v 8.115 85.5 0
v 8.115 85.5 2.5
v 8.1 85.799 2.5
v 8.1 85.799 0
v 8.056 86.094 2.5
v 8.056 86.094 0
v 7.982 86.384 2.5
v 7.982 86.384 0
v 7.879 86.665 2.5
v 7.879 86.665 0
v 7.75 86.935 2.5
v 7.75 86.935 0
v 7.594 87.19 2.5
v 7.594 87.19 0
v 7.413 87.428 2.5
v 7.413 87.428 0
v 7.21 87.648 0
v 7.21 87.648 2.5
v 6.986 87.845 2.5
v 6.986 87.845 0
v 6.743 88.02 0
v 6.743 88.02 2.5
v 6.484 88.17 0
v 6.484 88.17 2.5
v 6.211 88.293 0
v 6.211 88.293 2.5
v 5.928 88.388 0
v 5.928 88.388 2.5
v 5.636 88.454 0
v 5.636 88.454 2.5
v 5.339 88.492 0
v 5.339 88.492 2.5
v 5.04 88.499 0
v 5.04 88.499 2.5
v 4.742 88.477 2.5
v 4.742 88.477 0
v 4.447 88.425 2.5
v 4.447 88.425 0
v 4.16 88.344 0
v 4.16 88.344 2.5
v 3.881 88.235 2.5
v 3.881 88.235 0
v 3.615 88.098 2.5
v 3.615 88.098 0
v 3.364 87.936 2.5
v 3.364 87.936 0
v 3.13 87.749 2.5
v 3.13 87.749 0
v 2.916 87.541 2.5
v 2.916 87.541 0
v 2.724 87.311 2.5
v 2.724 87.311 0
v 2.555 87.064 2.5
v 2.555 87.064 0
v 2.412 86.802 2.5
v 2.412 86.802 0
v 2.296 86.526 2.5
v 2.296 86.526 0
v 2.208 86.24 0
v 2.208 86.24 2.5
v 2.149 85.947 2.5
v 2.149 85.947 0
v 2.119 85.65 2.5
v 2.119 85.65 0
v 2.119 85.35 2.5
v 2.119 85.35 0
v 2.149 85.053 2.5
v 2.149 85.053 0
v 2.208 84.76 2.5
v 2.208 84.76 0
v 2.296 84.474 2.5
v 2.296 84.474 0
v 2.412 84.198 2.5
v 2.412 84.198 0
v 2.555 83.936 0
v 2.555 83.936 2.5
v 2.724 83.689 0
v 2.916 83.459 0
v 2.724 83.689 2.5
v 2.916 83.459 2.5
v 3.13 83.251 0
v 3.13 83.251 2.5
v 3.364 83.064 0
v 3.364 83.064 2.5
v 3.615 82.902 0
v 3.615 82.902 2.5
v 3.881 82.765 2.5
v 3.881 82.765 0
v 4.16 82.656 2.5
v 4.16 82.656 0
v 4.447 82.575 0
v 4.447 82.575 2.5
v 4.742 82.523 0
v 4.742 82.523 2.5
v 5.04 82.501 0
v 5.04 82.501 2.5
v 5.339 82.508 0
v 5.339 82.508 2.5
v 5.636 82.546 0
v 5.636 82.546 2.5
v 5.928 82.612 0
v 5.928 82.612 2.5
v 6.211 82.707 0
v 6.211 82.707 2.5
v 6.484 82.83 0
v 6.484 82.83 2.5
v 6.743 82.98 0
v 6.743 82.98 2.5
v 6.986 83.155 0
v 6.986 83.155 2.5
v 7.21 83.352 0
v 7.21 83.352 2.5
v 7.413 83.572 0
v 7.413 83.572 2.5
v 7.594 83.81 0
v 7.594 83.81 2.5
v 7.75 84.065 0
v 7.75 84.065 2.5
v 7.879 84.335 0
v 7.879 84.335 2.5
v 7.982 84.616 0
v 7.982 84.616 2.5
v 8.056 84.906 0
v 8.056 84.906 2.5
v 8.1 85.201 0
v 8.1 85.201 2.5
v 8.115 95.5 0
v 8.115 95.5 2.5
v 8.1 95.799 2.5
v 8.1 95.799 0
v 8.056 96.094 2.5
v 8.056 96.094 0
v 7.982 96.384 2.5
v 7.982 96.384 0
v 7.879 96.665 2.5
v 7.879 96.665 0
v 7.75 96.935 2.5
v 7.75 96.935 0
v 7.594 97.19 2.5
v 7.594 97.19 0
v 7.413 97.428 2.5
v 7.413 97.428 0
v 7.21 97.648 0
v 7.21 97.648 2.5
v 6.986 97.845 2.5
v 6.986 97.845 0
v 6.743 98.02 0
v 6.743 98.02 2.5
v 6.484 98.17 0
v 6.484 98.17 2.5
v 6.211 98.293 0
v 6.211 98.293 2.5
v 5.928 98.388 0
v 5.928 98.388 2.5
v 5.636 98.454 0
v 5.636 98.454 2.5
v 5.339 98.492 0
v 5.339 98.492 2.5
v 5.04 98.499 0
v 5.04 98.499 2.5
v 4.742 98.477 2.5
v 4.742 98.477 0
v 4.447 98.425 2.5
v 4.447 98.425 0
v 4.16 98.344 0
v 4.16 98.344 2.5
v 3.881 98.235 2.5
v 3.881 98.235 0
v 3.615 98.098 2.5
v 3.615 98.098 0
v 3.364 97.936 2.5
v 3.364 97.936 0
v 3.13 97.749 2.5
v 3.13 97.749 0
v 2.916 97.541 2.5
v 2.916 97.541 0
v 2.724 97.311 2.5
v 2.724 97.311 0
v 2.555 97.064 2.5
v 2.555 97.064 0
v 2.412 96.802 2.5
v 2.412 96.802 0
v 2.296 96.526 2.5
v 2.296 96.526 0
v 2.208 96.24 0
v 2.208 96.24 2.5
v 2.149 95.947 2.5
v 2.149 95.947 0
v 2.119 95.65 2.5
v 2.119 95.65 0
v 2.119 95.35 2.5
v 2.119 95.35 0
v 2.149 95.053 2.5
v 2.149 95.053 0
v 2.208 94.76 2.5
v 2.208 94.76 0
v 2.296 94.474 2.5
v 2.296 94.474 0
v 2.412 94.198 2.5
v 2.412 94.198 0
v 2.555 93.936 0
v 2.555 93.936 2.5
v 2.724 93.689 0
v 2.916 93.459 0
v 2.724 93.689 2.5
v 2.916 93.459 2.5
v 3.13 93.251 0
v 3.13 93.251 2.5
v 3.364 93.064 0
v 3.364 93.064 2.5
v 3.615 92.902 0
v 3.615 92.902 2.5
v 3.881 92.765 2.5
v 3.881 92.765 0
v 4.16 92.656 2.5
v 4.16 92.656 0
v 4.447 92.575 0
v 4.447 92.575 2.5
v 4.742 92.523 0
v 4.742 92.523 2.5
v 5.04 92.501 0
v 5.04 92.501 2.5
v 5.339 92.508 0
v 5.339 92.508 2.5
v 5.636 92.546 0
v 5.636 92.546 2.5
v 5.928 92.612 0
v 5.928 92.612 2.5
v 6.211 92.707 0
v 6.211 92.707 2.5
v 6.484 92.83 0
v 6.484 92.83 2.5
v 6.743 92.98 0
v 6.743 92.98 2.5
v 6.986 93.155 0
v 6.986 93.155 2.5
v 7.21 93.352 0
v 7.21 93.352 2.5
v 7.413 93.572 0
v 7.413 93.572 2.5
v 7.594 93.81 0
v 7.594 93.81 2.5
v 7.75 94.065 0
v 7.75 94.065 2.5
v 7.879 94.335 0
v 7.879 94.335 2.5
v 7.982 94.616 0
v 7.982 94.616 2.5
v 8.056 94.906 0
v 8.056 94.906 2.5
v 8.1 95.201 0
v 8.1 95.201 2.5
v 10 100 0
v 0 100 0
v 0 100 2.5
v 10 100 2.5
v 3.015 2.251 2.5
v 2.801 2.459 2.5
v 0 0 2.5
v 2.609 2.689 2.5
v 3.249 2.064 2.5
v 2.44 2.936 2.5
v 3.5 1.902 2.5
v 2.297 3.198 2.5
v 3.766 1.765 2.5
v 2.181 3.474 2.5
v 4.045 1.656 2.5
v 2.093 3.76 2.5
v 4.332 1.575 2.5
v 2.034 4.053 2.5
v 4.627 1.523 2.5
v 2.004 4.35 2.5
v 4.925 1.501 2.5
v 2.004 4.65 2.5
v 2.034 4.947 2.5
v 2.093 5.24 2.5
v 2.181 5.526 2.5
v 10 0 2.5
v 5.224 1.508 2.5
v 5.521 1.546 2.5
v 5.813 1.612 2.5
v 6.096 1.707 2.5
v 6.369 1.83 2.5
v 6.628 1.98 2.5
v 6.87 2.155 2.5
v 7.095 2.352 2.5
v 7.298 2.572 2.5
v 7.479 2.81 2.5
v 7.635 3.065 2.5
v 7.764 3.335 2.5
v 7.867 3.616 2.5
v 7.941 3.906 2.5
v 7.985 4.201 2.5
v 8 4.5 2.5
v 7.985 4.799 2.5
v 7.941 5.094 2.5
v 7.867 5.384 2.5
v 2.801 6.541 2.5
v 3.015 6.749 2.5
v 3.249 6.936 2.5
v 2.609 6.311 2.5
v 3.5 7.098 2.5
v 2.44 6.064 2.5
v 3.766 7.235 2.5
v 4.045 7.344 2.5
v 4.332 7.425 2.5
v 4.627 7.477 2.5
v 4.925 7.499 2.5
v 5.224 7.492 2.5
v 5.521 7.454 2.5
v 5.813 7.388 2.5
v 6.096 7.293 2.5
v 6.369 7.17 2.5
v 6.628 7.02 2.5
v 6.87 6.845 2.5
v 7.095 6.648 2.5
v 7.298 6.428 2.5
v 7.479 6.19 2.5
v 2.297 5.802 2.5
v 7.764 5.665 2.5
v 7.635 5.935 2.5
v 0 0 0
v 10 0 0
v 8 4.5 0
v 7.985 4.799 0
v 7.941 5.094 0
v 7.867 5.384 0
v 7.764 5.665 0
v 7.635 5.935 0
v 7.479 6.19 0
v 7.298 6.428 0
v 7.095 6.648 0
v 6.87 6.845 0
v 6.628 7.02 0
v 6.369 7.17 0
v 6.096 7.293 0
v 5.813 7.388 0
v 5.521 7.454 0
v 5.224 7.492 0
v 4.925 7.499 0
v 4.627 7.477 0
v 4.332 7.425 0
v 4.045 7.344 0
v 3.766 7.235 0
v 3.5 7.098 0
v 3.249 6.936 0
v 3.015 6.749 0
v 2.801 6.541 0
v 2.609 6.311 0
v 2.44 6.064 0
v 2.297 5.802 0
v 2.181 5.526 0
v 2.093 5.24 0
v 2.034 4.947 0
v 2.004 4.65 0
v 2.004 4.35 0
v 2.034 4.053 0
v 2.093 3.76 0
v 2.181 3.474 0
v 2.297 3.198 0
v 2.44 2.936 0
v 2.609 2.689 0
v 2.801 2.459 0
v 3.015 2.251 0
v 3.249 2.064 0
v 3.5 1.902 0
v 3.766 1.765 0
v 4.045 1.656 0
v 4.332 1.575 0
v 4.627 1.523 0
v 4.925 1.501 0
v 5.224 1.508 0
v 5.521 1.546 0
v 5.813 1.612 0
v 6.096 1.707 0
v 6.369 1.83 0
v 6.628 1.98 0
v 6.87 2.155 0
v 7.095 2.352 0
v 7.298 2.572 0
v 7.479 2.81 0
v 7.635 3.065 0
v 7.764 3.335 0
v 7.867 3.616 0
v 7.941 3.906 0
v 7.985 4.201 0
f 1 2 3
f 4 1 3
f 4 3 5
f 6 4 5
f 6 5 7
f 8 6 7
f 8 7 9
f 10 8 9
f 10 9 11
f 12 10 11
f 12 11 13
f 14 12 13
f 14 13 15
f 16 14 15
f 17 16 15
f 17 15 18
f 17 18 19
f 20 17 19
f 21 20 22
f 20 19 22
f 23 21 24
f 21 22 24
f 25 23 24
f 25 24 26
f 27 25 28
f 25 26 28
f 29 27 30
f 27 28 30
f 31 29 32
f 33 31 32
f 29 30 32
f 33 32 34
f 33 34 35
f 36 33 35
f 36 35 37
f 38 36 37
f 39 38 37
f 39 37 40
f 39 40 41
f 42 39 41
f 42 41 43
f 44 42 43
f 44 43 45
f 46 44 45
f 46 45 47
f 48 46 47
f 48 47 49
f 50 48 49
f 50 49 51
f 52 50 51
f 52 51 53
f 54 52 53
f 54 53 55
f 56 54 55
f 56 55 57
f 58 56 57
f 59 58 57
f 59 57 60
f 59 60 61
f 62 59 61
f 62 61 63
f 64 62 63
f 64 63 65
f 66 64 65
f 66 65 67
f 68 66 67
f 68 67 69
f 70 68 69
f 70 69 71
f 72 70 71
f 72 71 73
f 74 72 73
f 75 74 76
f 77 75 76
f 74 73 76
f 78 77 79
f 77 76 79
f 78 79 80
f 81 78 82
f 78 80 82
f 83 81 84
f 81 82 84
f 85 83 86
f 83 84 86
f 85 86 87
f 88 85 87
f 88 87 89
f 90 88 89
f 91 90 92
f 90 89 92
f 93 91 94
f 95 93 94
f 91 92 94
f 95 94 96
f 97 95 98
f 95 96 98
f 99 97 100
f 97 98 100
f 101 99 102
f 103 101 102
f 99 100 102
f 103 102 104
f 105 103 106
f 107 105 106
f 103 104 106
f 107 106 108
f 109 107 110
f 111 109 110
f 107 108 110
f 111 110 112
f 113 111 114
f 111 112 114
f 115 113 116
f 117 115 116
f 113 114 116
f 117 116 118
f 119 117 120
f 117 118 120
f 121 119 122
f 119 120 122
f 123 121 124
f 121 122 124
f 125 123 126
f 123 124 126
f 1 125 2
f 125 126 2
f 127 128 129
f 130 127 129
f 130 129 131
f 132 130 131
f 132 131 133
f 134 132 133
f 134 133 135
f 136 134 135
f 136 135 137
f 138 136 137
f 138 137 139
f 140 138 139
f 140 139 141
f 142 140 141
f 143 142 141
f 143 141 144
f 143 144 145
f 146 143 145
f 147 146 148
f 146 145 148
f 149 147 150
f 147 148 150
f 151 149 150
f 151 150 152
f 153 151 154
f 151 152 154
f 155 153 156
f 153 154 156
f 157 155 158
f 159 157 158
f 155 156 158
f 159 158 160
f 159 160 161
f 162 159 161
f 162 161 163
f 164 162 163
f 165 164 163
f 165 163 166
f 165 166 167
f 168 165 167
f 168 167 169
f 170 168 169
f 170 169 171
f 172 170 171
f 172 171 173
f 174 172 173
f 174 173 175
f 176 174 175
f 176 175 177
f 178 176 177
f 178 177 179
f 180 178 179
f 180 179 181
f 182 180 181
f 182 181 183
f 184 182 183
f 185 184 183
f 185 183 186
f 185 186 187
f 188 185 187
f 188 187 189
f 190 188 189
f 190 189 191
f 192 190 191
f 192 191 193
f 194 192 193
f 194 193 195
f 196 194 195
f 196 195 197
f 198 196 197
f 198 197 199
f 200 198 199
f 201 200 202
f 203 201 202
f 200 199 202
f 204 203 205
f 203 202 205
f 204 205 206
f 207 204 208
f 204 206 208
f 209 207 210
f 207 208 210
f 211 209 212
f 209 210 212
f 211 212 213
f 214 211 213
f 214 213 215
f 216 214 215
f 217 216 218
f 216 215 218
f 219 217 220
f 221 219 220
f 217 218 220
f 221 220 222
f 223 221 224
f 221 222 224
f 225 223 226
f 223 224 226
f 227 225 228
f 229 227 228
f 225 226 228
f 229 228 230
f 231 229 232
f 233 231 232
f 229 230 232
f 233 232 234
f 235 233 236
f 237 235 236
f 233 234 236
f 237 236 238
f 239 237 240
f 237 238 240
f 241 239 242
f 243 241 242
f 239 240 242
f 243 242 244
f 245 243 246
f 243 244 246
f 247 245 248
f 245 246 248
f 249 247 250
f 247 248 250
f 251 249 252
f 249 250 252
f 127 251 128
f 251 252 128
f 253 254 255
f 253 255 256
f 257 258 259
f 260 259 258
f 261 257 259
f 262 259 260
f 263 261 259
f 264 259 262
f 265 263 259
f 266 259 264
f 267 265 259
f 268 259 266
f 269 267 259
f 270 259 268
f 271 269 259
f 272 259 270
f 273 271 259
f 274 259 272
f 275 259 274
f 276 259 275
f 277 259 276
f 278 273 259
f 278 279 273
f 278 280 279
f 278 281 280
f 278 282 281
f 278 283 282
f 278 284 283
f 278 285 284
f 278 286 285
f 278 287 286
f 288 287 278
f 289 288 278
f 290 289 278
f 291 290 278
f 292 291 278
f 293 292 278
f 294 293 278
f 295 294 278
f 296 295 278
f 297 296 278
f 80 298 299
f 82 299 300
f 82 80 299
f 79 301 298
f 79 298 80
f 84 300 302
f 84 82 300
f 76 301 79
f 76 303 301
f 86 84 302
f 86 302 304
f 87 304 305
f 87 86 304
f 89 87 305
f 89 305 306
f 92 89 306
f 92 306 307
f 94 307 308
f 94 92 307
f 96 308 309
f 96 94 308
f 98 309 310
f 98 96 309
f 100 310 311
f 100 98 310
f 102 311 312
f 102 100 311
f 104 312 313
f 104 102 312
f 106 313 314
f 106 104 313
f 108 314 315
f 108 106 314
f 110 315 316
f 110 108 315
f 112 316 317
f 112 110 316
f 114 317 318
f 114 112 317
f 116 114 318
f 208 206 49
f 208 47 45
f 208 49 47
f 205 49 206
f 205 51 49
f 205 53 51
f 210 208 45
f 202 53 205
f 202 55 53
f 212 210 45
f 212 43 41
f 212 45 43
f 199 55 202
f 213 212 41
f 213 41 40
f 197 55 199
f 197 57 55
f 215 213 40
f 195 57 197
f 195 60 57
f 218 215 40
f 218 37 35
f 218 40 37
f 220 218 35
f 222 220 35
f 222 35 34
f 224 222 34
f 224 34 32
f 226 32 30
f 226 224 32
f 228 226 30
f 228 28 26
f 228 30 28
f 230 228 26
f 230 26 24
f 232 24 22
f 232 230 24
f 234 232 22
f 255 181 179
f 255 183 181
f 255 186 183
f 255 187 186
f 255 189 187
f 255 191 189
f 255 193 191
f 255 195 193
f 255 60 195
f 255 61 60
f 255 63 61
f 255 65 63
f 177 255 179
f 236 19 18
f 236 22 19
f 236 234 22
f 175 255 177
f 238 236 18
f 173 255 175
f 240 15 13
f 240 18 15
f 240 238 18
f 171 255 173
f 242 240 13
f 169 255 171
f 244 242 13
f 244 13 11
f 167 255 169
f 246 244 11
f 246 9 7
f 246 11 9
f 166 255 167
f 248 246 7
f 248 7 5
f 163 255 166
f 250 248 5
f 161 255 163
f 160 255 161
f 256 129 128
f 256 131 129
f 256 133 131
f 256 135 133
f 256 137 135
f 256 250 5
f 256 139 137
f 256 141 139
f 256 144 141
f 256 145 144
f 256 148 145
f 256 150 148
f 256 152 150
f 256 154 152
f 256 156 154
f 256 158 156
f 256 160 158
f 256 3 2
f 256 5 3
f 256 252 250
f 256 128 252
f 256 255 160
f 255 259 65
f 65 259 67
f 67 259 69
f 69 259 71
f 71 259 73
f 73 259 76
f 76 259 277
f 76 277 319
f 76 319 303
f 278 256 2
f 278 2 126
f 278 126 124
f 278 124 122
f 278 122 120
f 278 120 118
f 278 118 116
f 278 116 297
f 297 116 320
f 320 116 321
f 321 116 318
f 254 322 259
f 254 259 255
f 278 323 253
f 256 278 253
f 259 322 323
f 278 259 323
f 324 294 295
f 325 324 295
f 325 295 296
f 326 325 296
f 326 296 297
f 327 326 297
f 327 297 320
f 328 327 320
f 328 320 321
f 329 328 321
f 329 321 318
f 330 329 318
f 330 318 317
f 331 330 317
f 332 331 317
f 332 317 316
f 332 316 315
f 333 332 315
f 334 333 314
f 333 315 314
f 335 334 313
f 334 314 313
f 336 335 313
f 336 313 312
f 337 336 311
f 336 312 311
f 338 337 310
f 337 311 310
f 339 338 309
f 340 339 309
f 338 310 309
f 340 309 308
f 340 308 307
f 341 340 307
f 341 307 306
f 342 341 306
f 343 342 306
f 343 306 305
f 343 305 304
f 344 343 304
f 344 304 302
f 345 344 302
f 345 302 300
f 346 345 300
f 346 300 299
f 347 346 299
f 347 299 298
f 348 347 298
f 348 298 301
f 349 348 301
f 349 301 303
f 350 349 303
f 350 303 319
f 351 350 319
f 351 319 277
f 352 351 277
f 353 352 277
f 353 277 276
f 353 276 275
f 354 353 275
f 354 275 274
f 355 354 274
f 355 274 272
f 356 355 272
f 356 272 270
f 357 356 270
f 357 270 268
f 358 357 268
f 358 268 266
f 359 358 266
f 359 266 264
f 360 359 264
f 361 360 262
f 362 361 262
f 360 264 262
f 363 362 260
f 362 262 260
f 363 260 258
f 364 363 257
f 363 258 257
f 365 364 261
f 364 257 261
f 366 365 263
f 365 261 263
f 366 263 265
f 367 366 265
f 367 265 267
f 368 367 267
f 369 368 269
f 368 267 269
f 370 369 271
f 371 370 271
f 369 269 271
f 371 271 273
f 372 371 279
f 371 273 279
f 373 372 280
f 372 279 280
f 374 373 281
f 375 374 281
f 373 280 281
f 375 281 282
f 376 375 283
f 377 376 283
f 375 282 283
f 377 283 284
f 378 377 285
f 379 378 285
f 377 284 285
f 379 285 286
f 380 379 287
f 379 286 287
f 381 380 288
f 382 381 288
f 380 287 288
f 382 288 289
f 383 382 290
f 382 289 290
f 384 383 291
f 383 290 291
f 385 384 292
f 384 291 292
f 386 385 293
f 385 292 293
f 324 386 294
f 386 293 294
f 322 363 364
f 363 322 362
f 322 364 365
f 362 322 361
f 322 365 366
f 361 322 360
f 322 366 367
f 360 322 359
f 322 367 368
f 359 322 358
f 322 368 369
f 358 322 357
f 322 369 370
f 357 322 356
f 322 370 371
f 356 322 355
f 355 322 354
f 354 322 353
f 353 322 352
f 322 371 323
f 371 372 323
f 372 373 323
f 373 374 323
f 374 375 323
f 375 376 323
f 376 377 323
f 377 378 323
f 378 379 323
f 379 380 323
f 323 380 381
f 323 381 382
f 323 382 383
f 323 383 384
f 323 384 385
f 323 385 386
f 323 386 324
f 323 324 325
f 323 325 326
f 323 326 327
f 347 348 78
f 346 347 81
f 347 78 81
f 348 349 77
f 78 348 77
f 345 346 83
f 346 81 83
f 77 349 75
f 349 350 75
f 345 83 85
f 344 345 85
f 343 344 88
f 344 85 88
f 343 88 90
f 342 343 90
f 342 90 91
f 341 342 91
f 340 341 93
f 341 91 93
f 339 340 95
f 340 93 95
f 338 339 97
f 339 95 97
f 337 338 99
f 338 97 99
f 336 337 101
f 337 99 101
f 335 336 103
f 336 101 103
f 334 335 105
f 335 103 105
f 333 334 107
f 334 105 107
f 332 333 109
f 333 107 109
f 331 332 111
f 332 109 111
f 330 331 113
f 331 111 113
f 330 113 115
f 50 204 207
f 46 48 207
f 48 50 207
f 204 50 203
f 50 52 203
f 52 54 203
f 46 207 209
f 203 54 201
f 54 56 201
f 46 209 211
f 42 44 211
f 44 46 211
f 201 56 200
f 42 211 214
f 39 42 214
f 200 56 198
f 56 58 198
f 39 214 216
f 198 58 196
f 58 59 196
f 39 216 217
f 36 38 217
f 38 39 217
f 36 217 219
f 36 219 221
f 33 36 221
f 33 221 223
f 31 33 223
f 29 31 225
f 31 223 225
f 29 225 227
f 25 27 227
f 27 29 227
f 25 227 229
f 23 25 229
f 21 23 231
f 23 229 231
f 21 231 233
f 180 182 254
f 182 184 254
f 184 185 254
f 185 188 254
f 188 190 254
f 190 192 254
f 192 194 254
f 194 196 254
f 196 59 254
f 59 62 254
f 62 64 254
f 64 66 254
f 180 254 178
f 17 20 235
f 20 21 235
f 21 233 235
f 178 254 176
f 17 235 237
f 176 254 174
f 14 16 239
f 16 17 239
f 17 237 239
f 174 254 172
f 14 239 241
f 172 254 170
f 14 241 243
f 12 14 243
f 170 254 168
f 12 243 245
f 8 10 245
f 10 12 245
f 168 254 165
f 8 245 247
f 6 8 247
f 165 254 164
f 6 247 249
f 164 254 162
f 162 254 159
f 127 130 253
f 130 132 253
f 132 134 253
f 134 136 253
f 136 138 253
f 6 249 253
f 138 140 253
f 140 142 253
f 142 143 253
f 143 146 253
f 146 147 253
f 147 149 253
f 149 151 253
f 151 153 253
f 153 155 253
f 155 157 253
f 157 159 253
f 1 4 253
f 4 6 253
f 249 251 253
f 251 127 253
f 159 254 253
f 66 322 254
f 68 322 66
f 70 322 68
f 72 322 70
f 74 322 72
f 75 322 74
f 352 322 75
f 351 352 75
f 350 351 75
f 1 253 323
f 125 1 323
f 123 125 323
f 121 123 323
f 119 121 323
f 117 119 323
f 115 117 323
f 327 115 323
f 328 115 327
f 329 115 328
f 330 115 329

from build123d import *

# Parameters (mm, degrees)
SKETCH1_W           = 10
SKETCH1_H           = 100
BOSS_EXTRUDE1_DEPTH = 2.5
SKETCH2_R           = 3
CUT_EXTRUDE1_DEPTH  = 101.529846314
SKETCH5_R           = 3
CUT_EXTRUDE2_DEPTH  = 101.529846314
SKETCH3_R           = 3
CUT_EXTRUDE3_DEPTH  = 10


with BuildPart() as part:
    # Sketch1 → Boss-Extrude1 (new body)
    with BuildSketch(Plane.XY):
        with Locations((5, 50)):
            Rectangle(SKETCH1_W, SKETCH1_H)
    extrude(amount=BOSS_EXTRUDE1_DEPTH)

    # Sketch2 → Cut-Extrude1 (cut, through all)
    with BuildSketch(Plane.XY.offset(2.5)):
        with Locations((5, 4.5)):
            Circle(SKETCH2_R)
    extrude(amount=-CUT_EXTRUDE1_DEPTH, mode=Mode.SUBTRACT)

    # Sketch5 → Cut-Extrude2 (cut, through all)
    with BuildSketch(Plane.XY.offset(2.5)):
        with Locations((5.115048416, 85.5)):
            Circle(SKETCH5_R)
    extrude(amount=-CUT_EXTRUDE2_DEPTH, mode=Mode.SUBTRACT)

    # Sketch3 → Cut-Extrude3 (cut)
    with BuildSketch(Plane.XY.offset(2.5)):
        with Locations((5.115048416, 95.5)):
            Circle(SKETCH3_R)
    extrude(amount=-CUT_EXTRUDE3_DEPTH, mode=Mode.SUBTRACT)


solid = part.part
